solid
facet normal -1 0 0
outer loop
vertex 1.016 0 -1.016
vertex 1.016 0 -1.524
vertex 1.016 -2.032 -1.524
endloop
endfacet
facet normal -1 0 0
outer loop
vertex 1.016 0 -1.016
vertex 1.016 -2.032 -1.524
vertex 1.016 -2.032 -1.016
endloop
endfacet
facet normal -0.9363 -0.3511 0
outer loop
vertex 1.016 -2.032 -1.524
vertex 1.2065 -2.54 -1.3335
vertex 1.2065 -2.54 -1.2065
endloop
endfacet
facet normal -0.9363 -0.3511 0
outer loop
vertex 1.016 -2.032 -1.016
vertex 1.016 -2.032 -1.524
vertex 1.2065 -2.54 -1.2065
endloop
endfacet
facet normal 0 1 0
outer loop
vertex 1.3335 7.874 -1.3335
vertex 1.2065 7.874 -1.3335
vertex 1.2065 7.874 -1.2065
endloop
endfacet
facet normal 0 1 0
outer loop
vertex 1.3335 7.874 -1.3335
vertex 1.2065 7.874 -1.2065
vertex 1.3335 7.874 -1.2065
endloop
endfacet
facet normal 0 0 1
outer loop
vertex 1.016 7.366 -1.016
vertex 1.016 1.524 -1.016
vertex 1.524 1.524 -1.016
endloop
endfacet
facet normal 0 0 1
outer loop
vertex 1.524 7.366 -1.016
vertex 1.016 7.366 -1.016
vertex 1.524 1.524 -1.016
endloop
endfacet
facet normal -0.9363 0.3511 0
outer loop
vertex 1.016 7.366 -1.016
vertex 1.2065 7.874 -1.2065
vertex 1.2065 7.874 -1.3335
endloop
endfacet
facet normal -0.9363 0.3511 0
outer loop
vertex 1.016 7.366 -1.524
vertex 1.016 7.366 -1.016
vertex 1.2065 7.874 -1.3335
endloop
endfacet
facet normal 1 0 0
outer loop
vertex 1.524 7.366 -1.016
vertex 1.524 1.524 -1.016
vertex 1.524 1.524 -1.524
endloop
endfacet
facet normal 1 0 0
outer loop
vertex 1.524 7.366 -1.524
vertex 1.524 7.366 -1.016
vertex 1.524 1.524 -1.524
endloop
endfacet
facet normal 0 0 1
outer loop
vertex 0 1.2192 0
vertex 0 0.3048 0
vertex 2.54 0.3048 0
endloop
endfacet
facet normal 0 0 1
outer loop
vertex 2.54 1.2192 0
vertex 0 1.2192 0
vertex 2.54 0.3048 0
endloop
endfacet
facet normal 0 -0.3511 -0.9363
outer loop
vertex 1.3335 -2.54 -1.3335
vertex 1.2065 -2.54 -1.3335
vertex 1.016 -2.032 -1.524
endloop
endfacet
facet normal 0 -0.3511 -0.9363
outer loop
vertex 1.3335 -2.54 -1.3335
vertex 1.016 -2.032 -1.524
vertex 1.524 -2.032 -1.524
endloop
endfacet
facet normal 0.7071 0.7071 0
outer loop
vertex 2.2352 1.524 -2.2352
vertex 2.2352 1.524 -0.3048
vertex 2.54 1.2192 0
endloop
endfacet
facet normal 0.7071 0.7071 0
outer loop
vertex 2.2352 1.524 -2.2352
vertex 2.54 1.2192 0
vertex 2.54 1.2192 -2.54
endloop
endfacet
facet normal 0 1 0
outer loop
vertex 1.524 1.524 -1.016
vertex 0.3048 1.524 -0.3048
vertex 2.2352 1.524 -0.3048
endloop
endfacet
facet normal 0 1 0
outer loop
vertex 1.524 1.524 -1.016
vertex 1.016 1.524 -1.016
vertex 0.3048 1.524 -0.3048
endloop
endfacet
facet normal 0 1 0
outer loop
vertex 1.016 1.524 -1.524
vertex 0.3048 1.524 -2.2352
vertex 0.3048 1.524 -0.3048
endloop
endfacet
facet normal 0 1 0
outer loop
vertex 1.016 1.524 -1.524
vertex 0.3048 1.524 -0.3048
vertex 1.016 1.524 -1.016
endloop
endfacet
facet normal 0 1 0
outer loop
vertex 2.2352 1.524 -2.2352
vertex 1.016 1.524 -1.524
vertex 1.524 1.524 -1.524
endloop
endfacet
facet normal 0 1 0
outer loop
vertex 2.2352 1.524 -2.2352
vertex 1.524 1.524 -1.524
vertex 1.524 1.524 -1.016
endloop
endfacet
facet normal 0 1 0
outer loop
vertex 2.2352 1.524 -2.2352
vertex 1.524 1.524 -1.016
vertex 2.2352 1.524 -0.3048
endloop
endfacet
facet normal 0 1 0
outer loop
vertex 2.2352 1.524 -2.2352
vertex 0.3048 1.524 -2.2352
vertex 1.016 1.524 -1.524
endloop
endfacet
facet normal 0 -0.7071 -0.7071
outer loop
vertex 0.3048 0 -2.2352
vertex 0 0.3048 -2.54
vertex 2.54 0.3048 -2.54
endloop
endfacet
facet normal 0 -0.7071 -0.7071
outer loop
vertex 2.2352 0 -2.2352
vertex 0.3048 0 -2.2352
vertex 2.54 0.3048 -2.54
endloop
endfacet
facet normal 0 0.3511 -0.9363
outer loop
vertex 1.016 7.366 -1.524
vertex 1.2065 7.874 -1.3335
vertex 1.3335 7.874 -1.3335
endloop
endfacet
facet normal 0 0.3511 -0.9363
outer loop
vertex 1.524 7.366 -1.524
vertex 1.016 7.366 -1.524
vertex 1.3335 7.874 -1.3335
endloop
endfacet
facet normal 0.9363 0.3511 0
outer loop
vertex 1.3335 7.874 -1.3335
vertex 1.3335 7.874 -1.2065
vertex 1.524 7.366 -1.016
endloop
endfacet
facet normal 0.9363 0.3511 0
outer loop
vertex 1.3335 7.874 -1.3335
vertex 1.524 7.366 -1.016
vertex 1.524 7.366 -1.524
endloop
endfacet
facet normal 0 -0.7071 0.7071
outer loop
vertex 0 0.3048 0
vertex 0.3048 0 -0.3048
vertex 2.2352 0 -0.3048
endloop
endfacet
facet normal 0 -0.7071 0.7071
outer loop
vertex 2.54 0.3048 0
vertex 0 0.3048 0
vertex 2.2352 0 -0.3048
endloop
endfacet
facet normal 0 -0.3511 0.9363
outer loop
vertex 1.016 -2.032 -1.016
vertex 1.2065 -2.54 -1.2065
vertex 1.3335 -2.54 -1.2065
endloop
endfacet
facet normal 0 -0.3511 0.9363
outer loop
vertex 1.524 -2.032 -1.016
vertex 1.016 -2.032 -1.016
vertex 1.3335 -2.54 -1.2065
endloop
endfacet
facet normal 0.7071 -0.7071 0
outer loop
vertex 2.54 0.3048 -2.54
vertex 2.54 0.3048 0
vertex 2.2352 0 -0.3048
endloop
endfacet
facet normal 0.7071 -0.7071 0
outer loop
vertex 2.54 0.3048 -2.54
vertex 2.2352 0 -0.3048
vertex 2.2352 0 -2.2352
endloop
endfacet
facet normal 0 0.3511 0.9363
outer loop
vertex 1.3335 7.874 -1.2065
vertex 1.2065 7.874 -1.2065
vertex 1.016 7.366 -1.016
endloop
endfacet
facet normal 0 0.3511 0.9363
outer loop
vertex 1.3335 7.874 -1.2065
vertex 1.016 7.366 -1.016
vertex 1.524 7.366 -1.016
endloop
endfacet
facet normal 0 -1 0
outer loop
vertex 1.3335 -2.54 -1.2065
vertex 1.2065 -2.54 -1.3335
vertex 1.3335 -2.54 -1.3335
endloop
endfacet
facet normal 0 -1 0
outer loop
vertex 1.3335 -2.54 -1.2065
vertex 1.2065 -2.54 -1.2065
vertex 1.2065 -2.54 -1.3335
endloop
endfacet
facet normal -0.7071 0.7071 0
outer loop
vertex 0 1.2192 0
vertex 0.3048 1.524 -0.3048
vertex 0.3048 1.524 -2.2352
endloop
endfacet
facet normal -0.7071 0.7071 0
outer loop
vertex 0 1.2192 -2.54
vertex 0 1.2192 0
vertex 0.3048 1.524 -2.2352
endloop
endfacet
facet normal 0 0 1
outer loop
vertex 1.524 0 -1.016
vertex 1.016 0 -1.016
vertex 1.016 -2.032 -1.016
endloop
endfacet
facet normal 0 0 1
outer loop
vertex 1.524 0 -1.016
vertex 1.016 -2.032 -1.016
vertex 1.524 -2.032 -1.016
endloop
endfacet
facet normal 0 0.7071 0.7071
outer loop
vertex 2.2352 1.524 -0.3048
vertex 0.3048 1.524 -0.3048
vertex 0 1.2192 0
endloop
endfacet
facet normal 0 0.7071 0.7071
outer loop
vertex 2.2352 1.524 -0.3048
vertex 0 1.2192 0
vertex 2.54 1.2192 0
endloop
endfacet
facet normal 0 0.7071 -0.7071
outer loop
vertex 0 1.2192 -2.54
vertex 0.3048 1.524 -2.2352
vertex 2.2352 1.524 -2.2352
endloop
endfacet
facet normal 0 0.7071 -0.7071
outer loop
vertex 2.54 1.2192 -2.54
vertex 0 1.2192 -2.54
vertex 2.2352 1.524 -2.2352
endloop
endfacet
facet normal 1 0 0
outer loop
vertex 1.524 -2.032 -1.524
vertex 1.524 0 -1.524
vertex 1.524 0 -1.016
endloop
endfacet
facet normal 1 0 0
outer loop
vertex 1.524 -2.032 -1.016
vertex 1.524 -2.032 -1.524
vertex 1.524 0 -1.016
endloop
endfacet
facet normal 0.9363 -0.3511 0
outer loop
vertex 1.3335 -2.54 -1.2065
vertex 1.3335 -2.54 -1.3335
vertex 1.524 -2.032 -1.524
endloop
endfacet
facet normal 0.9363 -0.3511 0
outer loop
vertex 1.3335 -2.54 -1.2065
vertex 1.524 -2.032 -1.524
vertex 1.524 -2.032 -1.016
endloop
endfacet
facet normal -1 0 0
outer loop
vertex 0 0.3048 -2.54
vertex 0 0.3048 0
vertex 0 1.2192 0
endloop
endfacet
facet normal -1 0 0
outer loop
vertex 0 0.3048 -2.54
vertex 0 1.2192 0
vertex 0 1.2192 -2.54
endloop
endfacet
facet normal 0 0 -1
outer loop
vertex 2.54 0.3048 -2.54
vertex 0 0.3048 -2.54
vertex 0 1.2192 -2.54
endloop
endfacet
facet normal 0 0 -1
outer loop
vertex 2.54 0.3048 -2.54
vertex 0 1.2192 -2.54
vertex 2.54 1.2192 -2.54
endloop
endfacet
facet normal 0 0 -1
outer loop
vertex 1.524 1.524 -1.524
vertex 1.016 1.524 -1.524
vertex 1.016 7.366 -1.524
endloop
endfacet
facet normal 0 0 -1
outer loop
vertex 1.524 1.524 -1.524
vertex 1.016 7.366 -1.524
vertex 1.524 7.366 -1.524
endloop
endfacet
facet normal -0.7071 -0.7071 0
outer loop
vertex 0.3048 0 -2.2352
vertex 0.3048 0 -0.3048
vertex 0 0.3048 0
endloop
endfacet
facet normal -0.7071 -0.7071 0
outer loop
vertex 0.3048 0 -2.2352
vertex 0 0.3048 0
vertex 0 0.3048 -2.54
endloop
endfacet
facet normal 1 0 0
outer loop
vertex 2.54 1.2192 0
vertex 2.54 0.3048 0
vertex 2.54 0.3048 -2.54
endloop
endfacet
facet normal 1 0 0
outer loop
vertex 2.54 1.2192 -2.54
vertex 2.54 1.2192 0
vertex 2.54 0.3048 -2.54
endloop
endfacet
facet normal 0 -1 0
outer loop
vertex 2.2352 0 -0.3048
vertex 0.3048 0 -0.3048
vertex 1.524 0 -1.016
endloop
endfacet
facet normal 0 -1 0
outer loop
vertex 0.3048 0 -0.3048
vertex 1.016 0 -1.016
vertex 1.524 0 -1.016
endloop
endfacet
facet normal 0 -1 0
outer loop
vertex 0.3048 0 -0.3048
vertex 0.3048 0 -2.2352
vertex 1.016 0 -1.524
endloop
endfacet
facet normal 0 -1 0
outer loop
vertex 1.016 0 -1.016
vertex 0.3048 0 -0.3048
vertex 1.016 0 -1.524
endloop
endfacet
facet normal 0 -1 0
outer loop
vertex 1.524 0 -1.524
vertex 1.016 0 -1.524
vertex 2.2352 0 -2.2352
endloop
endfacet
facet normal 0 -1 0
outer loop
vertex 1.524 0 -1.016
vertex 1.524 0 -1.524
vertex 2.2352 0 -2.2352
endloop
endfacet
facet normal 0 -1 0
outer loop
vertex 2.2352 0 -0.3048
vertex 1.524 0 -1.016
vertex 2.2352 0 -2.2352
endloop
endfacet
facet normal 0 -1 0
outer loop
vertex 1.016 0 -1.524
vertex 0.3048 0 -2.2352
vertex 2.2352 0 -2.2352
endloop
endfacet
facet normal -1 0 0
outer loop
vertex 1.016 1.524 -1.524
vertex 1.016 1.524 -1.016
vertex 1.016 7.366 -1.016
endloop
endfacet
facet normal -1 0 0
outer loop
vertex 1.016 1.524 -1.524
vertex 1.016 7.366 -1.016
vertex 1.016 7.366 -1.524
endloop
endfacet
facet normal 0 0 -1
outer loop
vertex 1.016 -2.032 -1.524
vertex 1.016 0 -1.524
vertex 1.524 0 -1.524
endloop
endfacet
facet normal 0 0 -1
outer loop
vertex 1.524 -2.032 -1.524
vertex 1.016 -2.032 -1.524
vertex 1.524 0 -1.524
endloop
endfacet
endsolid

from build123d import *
from OCP.BRepFilletAPI import BRepFilletAPI_MakeChamfer

# Parameters (mm, degrees)
SKETCH1_W           = 2.54
SKETCH1_H           = 2.54
BOSS_EXTRUDE1_DEPTH = 1.524
SKETCH2_W           = 0.508
SKETCH2_H           = 0.508
BOSS_EXTRUDE2_DEPTH = 6.35
SKETCH3_W           = 0.508
SKETCH3_H           = 0.508
BOSS_EXTRUDE3_DEPTH = 2.54
CHAMFER1_SIZE       = 0.508
CHAMFER1_SIZE2      = 0.1905
CHAMFER2_SIZE       = 0.508
CHAMFER2_SIZE2      = 0.1905
CHAMFER4_SIZE       = 0.3048
CHAMFER5_SIZE       = 0.3048


with BuildPart() as part:
    # Sketch1 → Boss-Extrude1 (new body)
    with BuildSketch(Plane(origin=(0, 0, 0), x_dir=(1, 0, 0), z_dir=(0, 1, 0))):
        with Locations((1.27, 1.27)):
            Rectangle(SKETCH1_W, SKETCH1_H)
    extrude(amount=BOSS_EXTRUDE1_DEPTH)

    # Sketch2 → Boss-Extrude2 (add)
    with BuildSketch(Plane(origin=(0, 1.524, 0), x_dir=(1, 0, 0), z_dir=(0, 1, 0))):
        with Locations((1.27, 1.27)):
            Rectangle(SKETCH2_W, SKETCH2_H)
    extrude(amount=BOSS_EXTRUDE2_DEPTH)

    # Sketch3 → Boss-Extrude3 (add)
    with BuildSketch(Plane.XZ):
        with Locations((1.27, -1.27)):
            Rectangle(SKETCH3_W, SKETCH3_H)
    extrude(amount=BOSS_EXTRUDE3_DEPTH)

    # Chamfer1: one chamfer whose edges measure the first distance from different faces: ONE call of the kernel's chamfer builder (chamfer() names one face for all edges)
    chamfer1_edges_1 = [part.edges().sort_by_distance(p)[0] for p in [
        (1.016, 7.874, -1.27),
    ]]
    chamfer1_side_1 = [part.faces().sort_by_distance(p)[0] for p in [
        (1.016, 4.699, -1.27),
    ]]
    chamfer1_edges_2 = [part.edges().sort_by_distance(p)[0] for p in [
        (1.27, 7.874, -1.016),
    ]]
    chamfer1_side_2 = [part.faces().sort_by_distance(p)[0] for p in [
        (1.27, 4.699, -1.016),
    ]]
    chamfer1_edges_3 = [part.edges().sort_by_distance(p)[0] for p in [
        (1.524, 7.874, -1.27),
    ]]
    chamfer1_side_3 = [part.faces().sort_by_distance(p)[0] for p in [
        (1.524, 4.699, -1.27),
    ]]
    chamfer1_edges_4 = [part.edges().sort_by_distance(p)[0] for p in [
        (1.27, 7.874, -1.524),
    ]]
    chamfer1_side_4 = [part.faces().sort_by_distance(p)[0] for p in [
        (1.27, 4.699, -1.524),
    ]]
    chamfer1 = BRepFilletAPI_MakeChamfer(part.part.solid().wrapped)
    for e in chamfer1_edges_1:
        chamfer1.Add(CHAMFER1_SIZE, CHAMFER1_SIZE2, e.wrapped, chamfer1_side_1[0].wrapped)  # the first distance lies on this face
    for e in chamfer1_edges_2:
        chamfer1.Add(CHAMFER1_SIZE, CHAMFER1_SIZE2, e.wrapped, chamfer1_side_2[0].wrapped)  # the first distance lies on this face
    for e in chamfer1_edges_3:
        chamfer1.Add(CHAMFER1_SIZE, CHAMFER1_SIZE2, e.wrapped, chamfer1_side_3[0].wrapped)  # the first distance lies on this face
    for e in chamfer1_edges_4:
        chamfer1.Add(CHAMFER1_SIZE, CHAMFER1_SIZE2, e.wrapped, chamfer1_side_4[0].wrapped)  # the first distance lies on this face
    add(Compound.cast(chamfer1.Shape()), mode=Mode.REPLACE)

    # Chamfer2: one chamfer whose edges measure the first distance from different faces: ONE call of the kernel's chamfer builder (chamfer() names one face for all edges)
    chamfer2_edges_1 = [part.edges().sort_by_distance(p)[0] for p in [
        (1.27, -2.54, -1.524),
    ]]
    chamfer2_side_1 = [part.faces().sort_by_distance(p)[0] for p in [
        (1.27, -1.27, -1.524),
    ]]
    chamfer2_edges_2 = [part.edges().sort_by_distance(p)[0] for p in [
        (1.524, -2.54, -1.27),
    ]]
    chamfer2_side_2 = [part.faces().sort_by_distance(p)[0] for p in [
        (1.524, -1.27, -1.27),
    ]]
    chamfer2_edges_3 = [part.edges().sort_by_distance(p)[0] for p in [
        (1.27, -2.54, -1.016),
    ]]
    chamfer2_side_3 = [part.faces().sort_by_distance(p)[0] for p in [
        (1.27, -1.27, -1.016),
    ]]
    chamfer2_edges_4 = [part.edges().sort_by_distance(p)[0] for p in [
        (1.016, -2.54, -1.27),
    ]]
    chamfer2_side_4 = [part.faces().sort_by_distance(p)[0] for p in [
        (1.016, -1.27, -1.27),
    ]]
    chamfer2 = BRepFilletAPI_MakeChamfer(part.part.solid().wrapped)
    for e in chamfer2_edges_1:
        chamfer2.Add(CHAMFER2_SIZE, CHAMFER2_SIZE2, e.wrapped, chamfer2_side_1[0].wrapped)  # the first distance lies on this face
    for e in chamfer2_edges_2:
        chamfer2.Add(CHAMFER2_SIZE, CHAMFER2_SIZE2, e.wrapped, chamfer2_side_2[0].wrapped)  # the first distance lies on this face
    for e in chamfer2_edges_3:
        chamfer2.Add(CHAMFER2_SIZE, CHAMFER2_SIZE2, e.wrapped, chamfer2_side_3[0].wrapped)  # the first distance lies on this face
    for e in chamfer2_edges_4:
        chamfer2.Add(CHAMFER2_SIZE, CHAMFER2_SIZE2, e.wrapped, chamfer2_side_4[0].wrapped)  # the first distance lies on this face
    add(Compound.cast(chamfer2.Shape()), mode=Mode.REPLACE)

    # Chamfer4
    chamfer4_edges = [part.edges().sort_by_distance(p)[0] for p in [
        (2.54, 1.524, -1.27),
        (1.27, 1.524, -2.54),
        (0, 1.524, -1.27),
        (1.27, 1.524, 0),
    ]]
    chamfer(chamfer4_edges, length=CHAMFER4_SIZE)

    # Chamfer5
    chamfer5_edges = [part.edges().sort_by_distance(p)[0] for p in [
        (1.27, 0, -2.54),
        (2.54, 0, -1.27),
        (1.27, 0, 0),
        (0, 0, -1.27),
    ]]
    chamfer(chamfer5_edges, length=CHAMFER5_SIZE)


solid = part.part
